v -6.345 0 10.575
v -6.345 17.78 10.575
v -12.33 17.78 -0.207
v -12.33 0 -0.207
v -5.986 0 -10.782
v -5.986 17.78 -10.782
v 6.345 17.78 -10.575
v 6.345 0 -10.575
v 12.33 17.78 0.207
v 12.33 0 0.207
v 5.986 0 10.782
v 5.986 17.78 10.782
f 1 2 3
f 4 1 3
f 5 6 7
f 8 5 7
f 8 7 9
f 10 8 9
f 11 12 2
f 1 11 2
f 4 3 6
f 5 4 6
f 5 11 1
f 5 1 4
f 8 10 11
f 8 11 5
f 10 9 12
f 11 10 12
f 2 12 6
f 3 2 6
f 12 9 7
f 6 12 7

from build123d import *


with BuildPart() as f2:
    # F2: sweep along a path in F1
    with BuildLine(Plane.XY) as f2_path:
        Line((0, 0), (0, 17.78))
    # F0 (on Front) → F2 (sweep)
    with BuildSketch(Plane.XZ):
        Polygon((12.330452, 0.207421), (5.985594, 10.782195), (-6.344858, 10.574774), (-12.330452, -0.207421), (-5.985594, -10.782195), (6.344858, -10.574774), align=None)
    sweep(path=f2_path.line)


solid = f2.part
